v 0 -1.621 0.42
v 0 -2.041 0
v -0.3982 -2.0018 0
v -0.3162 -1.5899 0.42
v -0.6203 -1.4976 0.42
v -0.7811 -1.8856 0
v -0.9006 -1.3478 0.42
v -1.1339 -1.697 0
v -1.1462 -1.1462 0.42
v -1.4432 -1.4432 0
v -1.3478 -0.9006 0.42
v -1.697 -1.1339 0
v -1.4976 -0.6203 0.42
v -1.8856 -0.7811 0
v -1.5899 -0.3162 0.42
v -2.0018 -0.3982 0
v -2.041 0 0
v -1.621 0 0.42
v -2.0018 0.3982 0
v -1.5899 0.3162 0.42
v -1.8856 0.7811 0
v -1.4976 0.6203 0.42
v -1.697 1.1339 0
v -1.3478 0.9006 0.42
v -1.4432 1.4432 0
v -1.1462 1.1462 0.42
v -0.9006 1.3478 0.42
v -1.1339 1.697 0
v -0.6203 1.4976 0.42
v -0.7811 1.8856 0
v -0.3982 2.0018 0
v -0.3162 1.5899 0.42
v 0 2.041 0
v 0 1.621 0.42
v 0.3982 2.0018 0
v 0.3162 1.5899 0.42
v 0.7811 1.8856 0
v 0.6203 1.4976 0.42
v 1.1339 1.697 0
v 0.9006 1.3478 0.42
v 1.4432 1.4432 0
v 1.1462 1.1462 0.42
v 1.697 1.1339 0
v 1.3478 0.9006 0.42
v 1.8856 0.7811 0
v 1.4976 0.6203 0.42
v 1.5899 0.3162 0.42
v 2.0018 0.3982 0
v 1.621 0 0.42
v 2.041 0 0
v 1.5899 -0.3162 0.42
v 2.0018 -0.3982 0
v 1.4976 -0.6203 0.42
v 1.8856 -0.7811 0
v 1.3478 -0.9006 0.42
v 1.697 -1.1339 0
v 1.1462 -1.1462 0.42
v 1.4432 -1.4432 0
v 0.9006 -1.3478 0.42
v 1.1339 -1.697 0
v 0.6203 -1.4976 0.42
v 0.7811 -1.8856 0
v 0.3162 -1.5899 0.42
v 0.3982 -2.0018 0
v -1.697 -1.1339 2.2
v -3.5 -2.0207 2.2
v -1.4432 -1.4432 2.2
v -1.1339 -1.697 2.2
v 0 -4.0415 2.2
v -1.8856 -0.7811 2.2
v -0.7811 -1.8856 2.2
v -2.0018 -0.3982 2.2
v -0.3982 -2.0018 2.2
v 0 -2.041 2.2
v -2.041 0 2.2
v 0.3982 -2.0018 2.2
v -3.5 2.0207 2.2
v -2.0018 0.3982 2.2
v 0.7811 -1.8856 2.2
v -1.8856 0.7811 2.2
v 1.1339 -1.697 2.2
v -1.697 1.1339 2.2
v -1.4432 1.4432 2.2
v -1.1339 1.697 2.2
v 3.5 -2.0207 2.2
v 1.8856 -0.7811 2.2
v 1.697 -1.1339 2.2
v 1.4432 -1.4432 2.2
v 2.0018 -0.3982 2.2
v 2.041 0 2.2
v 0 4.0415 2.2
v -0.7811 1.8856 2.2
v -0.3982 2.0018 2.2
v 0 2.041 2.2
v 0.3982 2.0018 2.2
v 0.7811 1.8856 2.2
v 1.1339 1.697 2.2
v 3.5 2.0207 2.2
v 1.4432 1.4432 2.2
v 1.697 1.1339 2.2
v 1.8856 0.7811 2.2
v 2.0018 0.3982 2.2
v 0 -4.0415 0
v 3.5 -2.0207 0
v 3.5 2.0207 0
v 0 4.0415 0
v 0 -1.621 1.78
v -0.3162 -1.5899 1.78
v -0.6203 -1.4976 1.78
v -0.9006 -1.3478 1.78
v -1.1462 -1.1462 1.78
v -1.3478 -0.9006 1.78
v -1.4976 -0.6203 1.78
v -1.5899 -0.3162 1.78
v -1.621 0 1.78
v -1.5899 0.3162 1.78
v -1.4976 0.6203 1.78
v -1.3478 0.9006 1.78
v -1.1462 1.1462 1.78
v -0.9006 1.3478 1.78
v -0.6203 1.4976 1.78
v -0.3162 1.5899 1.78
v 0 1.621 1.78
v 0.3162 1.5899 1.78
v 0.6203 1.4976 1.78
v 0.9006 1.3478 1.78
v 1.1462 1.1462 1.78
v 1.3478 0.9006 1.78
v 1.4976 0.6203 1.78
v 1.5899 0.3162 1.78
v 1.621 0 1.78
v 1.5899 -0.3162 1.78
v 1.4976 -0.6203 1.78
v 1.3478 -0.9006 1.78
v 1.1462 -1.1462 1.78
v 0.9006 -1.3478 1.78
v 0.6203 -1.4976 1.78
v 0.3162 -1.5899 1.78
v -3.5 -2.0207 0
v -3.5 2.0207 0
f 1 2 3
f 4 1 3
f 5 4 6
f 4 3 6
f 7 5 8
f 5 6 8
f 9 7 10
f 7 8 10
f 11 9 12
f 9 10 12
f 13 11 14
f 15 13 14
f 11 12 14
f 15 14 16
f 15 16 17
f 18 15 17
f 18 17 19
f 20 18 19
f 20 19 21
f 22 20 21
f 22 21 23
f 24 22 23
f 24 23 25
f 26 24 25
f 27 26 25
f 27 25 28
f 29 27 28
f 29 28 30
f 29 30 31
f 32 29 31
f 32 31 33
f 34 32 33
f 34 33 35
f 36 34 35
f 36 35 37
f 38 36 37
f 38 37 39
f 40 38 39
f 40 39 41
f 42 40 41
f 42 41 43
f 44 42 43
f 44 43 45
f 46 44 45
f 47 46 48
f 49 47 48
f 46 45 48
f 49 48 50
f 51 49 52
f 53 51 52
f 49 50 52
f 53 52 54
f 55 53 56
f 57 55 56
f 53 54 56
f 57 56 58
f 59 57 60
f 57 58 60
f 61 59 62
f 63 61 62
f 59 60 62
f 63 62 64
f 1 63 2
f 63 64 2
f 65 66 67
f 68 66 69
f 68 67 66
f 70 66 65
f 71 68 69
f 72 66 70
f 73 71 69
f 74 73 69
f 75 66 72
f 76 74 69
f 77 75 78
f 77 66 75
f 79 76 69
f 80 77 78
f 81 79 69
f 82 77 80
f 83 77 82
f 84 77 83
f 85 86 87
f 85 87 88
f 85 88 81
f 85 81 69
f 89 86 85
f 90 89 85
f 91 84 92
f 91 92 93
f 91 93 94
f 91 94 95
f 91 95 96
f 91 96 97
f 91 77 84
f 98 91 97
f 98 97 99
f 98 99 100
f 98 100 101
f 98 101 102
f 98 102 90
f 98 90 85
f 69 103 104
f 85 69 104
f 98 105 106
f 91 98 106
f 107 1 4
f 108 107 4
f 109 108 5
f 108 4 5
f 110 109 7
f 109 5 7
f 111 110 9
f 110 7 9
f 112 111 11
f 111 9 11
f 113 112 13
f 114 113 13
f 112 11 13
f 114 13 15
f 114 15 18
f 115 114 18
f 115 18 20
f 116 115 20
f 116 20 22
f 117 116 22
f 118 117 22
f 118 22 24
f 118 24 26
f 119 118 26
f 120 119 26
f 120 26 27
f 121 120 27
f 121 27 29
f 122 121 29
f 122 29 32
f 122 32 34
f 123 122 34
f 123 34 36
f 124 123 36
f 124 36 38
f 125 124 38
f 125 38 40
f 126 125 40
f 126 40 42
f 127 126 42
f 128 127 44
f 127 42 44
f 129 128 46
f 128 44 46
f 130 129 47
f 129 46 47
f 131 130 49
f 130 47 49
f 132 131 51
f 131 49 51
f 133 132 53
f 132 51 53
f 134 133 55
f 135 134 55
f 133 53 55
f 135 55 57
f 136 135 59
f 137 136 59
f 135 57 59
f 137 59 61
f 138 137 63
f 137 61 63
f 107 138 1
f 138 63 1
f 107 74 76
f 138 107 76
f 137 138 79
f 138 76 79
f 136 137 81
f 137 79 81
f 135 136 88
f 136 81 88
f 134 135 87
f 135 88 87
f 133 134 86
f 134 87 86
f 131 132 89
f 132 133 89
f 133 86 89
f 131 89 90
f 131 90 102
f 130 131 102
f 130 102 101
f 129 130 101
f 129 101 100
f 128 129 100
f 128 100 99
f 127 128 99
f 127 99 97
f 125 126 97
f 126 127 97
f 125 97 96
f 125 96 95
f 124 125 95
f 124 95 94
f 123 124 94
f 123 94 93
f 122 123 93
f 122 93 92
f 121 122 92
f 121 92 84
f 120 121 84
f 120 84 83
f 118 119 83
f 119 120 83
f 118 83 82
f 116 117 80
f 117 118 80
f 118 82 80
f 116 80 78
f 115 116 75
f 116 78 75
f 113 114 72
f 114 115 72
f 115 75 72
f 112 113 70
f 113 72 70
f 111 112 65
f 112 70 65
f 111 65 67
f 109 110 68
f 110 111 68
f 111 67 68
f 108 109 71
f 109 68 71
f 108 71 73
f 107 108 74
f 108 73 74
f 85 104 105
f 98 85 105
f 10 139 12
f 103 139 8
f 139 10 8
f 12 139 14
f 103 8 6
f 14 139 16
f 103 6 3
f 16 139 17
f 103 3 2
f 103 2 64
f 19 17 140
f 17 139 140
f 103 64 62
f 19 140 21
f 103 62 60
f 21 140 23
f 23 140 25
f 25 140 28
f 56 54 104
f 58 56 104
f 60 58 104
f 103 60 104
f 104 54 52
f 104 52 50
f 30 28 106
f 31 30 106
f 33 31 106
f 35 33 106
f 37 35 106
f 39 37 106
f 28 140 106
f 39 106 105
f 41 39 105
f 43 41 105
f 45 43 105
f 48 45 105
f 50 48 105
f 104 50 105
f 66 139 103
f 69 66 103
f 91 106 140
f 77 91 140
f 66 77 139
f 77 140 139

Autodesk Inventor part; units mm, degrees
sketch "Sketch1" plane through (0, 0, 0) normal (0, 0, 1) x (1, 0, 0)
  circle A0 centre (0, 0) radius 3.5 construction
  line L0 (-3.5, 2.0207) -> (-3.5, -2.0207)
  line L1 (-3.5, -2.0207) -> (0, -4.0415)
  line L2 (0, -4.0415) -> (3.5, -2.0207)
  line L3 (3.5, -2.0207) -> (3.5, 2.0207)
  line L4 (3.5, 2.0207) -> (0, 4.0415)
  line L5 (0, 4.0415) -> (-3.5, 2.0207)
  line L6 (0, 5.658) -> (0, -5.658) projected
  line L7 (-4.9, 0) -> (4.9, 0) projected
  point P0 (0, 0)
  dimension "ParS" = 7
extrude "Extrusion1" add sketch "Sketch1" along normal blind 2.2
sketch "Sketch2" plane through (0, 0, 2.2) normal (0, 0, 1) x (1, 0, 0)
  point P0 (0, 0)
  point P1 (0, 0)
hole "Hole1" at (0, 0, 2.2) direction (0, 0, -1) diameter 3.242 end through all thread size "M4x0.7" class "6H" standard "ISO Metric profile"
ref_plane "MSC_PT1" through (0, 0, 2.2) normal (0, 0, 1) x (1, 0, 0)
ref_plane "MSC_PT2" through (0, 0, 0) normal (0, 0, -1) x (-1, 0, 0)
ref_plane "MSC_PF1" through (0, 0, 0) normal (1, 0, 0) x (0, 1, 0)
chamfer "Chamfer1" distance 0.42 angle 45 2 edges at (0, 1.621, 2.2) (0, 1.621, 0)
equation "\"d17\" = 0.6 * PTC"
equation "\"d18\" = 0.6 * PTC"
equation "\"d4\" = M"
equation "\"PTC\" = 0.7"
equation "\"NND\" = 4"
equation "\"THREADDIA\" = NND"
properties part number "ISO 4036 - M4" material "Steel"
